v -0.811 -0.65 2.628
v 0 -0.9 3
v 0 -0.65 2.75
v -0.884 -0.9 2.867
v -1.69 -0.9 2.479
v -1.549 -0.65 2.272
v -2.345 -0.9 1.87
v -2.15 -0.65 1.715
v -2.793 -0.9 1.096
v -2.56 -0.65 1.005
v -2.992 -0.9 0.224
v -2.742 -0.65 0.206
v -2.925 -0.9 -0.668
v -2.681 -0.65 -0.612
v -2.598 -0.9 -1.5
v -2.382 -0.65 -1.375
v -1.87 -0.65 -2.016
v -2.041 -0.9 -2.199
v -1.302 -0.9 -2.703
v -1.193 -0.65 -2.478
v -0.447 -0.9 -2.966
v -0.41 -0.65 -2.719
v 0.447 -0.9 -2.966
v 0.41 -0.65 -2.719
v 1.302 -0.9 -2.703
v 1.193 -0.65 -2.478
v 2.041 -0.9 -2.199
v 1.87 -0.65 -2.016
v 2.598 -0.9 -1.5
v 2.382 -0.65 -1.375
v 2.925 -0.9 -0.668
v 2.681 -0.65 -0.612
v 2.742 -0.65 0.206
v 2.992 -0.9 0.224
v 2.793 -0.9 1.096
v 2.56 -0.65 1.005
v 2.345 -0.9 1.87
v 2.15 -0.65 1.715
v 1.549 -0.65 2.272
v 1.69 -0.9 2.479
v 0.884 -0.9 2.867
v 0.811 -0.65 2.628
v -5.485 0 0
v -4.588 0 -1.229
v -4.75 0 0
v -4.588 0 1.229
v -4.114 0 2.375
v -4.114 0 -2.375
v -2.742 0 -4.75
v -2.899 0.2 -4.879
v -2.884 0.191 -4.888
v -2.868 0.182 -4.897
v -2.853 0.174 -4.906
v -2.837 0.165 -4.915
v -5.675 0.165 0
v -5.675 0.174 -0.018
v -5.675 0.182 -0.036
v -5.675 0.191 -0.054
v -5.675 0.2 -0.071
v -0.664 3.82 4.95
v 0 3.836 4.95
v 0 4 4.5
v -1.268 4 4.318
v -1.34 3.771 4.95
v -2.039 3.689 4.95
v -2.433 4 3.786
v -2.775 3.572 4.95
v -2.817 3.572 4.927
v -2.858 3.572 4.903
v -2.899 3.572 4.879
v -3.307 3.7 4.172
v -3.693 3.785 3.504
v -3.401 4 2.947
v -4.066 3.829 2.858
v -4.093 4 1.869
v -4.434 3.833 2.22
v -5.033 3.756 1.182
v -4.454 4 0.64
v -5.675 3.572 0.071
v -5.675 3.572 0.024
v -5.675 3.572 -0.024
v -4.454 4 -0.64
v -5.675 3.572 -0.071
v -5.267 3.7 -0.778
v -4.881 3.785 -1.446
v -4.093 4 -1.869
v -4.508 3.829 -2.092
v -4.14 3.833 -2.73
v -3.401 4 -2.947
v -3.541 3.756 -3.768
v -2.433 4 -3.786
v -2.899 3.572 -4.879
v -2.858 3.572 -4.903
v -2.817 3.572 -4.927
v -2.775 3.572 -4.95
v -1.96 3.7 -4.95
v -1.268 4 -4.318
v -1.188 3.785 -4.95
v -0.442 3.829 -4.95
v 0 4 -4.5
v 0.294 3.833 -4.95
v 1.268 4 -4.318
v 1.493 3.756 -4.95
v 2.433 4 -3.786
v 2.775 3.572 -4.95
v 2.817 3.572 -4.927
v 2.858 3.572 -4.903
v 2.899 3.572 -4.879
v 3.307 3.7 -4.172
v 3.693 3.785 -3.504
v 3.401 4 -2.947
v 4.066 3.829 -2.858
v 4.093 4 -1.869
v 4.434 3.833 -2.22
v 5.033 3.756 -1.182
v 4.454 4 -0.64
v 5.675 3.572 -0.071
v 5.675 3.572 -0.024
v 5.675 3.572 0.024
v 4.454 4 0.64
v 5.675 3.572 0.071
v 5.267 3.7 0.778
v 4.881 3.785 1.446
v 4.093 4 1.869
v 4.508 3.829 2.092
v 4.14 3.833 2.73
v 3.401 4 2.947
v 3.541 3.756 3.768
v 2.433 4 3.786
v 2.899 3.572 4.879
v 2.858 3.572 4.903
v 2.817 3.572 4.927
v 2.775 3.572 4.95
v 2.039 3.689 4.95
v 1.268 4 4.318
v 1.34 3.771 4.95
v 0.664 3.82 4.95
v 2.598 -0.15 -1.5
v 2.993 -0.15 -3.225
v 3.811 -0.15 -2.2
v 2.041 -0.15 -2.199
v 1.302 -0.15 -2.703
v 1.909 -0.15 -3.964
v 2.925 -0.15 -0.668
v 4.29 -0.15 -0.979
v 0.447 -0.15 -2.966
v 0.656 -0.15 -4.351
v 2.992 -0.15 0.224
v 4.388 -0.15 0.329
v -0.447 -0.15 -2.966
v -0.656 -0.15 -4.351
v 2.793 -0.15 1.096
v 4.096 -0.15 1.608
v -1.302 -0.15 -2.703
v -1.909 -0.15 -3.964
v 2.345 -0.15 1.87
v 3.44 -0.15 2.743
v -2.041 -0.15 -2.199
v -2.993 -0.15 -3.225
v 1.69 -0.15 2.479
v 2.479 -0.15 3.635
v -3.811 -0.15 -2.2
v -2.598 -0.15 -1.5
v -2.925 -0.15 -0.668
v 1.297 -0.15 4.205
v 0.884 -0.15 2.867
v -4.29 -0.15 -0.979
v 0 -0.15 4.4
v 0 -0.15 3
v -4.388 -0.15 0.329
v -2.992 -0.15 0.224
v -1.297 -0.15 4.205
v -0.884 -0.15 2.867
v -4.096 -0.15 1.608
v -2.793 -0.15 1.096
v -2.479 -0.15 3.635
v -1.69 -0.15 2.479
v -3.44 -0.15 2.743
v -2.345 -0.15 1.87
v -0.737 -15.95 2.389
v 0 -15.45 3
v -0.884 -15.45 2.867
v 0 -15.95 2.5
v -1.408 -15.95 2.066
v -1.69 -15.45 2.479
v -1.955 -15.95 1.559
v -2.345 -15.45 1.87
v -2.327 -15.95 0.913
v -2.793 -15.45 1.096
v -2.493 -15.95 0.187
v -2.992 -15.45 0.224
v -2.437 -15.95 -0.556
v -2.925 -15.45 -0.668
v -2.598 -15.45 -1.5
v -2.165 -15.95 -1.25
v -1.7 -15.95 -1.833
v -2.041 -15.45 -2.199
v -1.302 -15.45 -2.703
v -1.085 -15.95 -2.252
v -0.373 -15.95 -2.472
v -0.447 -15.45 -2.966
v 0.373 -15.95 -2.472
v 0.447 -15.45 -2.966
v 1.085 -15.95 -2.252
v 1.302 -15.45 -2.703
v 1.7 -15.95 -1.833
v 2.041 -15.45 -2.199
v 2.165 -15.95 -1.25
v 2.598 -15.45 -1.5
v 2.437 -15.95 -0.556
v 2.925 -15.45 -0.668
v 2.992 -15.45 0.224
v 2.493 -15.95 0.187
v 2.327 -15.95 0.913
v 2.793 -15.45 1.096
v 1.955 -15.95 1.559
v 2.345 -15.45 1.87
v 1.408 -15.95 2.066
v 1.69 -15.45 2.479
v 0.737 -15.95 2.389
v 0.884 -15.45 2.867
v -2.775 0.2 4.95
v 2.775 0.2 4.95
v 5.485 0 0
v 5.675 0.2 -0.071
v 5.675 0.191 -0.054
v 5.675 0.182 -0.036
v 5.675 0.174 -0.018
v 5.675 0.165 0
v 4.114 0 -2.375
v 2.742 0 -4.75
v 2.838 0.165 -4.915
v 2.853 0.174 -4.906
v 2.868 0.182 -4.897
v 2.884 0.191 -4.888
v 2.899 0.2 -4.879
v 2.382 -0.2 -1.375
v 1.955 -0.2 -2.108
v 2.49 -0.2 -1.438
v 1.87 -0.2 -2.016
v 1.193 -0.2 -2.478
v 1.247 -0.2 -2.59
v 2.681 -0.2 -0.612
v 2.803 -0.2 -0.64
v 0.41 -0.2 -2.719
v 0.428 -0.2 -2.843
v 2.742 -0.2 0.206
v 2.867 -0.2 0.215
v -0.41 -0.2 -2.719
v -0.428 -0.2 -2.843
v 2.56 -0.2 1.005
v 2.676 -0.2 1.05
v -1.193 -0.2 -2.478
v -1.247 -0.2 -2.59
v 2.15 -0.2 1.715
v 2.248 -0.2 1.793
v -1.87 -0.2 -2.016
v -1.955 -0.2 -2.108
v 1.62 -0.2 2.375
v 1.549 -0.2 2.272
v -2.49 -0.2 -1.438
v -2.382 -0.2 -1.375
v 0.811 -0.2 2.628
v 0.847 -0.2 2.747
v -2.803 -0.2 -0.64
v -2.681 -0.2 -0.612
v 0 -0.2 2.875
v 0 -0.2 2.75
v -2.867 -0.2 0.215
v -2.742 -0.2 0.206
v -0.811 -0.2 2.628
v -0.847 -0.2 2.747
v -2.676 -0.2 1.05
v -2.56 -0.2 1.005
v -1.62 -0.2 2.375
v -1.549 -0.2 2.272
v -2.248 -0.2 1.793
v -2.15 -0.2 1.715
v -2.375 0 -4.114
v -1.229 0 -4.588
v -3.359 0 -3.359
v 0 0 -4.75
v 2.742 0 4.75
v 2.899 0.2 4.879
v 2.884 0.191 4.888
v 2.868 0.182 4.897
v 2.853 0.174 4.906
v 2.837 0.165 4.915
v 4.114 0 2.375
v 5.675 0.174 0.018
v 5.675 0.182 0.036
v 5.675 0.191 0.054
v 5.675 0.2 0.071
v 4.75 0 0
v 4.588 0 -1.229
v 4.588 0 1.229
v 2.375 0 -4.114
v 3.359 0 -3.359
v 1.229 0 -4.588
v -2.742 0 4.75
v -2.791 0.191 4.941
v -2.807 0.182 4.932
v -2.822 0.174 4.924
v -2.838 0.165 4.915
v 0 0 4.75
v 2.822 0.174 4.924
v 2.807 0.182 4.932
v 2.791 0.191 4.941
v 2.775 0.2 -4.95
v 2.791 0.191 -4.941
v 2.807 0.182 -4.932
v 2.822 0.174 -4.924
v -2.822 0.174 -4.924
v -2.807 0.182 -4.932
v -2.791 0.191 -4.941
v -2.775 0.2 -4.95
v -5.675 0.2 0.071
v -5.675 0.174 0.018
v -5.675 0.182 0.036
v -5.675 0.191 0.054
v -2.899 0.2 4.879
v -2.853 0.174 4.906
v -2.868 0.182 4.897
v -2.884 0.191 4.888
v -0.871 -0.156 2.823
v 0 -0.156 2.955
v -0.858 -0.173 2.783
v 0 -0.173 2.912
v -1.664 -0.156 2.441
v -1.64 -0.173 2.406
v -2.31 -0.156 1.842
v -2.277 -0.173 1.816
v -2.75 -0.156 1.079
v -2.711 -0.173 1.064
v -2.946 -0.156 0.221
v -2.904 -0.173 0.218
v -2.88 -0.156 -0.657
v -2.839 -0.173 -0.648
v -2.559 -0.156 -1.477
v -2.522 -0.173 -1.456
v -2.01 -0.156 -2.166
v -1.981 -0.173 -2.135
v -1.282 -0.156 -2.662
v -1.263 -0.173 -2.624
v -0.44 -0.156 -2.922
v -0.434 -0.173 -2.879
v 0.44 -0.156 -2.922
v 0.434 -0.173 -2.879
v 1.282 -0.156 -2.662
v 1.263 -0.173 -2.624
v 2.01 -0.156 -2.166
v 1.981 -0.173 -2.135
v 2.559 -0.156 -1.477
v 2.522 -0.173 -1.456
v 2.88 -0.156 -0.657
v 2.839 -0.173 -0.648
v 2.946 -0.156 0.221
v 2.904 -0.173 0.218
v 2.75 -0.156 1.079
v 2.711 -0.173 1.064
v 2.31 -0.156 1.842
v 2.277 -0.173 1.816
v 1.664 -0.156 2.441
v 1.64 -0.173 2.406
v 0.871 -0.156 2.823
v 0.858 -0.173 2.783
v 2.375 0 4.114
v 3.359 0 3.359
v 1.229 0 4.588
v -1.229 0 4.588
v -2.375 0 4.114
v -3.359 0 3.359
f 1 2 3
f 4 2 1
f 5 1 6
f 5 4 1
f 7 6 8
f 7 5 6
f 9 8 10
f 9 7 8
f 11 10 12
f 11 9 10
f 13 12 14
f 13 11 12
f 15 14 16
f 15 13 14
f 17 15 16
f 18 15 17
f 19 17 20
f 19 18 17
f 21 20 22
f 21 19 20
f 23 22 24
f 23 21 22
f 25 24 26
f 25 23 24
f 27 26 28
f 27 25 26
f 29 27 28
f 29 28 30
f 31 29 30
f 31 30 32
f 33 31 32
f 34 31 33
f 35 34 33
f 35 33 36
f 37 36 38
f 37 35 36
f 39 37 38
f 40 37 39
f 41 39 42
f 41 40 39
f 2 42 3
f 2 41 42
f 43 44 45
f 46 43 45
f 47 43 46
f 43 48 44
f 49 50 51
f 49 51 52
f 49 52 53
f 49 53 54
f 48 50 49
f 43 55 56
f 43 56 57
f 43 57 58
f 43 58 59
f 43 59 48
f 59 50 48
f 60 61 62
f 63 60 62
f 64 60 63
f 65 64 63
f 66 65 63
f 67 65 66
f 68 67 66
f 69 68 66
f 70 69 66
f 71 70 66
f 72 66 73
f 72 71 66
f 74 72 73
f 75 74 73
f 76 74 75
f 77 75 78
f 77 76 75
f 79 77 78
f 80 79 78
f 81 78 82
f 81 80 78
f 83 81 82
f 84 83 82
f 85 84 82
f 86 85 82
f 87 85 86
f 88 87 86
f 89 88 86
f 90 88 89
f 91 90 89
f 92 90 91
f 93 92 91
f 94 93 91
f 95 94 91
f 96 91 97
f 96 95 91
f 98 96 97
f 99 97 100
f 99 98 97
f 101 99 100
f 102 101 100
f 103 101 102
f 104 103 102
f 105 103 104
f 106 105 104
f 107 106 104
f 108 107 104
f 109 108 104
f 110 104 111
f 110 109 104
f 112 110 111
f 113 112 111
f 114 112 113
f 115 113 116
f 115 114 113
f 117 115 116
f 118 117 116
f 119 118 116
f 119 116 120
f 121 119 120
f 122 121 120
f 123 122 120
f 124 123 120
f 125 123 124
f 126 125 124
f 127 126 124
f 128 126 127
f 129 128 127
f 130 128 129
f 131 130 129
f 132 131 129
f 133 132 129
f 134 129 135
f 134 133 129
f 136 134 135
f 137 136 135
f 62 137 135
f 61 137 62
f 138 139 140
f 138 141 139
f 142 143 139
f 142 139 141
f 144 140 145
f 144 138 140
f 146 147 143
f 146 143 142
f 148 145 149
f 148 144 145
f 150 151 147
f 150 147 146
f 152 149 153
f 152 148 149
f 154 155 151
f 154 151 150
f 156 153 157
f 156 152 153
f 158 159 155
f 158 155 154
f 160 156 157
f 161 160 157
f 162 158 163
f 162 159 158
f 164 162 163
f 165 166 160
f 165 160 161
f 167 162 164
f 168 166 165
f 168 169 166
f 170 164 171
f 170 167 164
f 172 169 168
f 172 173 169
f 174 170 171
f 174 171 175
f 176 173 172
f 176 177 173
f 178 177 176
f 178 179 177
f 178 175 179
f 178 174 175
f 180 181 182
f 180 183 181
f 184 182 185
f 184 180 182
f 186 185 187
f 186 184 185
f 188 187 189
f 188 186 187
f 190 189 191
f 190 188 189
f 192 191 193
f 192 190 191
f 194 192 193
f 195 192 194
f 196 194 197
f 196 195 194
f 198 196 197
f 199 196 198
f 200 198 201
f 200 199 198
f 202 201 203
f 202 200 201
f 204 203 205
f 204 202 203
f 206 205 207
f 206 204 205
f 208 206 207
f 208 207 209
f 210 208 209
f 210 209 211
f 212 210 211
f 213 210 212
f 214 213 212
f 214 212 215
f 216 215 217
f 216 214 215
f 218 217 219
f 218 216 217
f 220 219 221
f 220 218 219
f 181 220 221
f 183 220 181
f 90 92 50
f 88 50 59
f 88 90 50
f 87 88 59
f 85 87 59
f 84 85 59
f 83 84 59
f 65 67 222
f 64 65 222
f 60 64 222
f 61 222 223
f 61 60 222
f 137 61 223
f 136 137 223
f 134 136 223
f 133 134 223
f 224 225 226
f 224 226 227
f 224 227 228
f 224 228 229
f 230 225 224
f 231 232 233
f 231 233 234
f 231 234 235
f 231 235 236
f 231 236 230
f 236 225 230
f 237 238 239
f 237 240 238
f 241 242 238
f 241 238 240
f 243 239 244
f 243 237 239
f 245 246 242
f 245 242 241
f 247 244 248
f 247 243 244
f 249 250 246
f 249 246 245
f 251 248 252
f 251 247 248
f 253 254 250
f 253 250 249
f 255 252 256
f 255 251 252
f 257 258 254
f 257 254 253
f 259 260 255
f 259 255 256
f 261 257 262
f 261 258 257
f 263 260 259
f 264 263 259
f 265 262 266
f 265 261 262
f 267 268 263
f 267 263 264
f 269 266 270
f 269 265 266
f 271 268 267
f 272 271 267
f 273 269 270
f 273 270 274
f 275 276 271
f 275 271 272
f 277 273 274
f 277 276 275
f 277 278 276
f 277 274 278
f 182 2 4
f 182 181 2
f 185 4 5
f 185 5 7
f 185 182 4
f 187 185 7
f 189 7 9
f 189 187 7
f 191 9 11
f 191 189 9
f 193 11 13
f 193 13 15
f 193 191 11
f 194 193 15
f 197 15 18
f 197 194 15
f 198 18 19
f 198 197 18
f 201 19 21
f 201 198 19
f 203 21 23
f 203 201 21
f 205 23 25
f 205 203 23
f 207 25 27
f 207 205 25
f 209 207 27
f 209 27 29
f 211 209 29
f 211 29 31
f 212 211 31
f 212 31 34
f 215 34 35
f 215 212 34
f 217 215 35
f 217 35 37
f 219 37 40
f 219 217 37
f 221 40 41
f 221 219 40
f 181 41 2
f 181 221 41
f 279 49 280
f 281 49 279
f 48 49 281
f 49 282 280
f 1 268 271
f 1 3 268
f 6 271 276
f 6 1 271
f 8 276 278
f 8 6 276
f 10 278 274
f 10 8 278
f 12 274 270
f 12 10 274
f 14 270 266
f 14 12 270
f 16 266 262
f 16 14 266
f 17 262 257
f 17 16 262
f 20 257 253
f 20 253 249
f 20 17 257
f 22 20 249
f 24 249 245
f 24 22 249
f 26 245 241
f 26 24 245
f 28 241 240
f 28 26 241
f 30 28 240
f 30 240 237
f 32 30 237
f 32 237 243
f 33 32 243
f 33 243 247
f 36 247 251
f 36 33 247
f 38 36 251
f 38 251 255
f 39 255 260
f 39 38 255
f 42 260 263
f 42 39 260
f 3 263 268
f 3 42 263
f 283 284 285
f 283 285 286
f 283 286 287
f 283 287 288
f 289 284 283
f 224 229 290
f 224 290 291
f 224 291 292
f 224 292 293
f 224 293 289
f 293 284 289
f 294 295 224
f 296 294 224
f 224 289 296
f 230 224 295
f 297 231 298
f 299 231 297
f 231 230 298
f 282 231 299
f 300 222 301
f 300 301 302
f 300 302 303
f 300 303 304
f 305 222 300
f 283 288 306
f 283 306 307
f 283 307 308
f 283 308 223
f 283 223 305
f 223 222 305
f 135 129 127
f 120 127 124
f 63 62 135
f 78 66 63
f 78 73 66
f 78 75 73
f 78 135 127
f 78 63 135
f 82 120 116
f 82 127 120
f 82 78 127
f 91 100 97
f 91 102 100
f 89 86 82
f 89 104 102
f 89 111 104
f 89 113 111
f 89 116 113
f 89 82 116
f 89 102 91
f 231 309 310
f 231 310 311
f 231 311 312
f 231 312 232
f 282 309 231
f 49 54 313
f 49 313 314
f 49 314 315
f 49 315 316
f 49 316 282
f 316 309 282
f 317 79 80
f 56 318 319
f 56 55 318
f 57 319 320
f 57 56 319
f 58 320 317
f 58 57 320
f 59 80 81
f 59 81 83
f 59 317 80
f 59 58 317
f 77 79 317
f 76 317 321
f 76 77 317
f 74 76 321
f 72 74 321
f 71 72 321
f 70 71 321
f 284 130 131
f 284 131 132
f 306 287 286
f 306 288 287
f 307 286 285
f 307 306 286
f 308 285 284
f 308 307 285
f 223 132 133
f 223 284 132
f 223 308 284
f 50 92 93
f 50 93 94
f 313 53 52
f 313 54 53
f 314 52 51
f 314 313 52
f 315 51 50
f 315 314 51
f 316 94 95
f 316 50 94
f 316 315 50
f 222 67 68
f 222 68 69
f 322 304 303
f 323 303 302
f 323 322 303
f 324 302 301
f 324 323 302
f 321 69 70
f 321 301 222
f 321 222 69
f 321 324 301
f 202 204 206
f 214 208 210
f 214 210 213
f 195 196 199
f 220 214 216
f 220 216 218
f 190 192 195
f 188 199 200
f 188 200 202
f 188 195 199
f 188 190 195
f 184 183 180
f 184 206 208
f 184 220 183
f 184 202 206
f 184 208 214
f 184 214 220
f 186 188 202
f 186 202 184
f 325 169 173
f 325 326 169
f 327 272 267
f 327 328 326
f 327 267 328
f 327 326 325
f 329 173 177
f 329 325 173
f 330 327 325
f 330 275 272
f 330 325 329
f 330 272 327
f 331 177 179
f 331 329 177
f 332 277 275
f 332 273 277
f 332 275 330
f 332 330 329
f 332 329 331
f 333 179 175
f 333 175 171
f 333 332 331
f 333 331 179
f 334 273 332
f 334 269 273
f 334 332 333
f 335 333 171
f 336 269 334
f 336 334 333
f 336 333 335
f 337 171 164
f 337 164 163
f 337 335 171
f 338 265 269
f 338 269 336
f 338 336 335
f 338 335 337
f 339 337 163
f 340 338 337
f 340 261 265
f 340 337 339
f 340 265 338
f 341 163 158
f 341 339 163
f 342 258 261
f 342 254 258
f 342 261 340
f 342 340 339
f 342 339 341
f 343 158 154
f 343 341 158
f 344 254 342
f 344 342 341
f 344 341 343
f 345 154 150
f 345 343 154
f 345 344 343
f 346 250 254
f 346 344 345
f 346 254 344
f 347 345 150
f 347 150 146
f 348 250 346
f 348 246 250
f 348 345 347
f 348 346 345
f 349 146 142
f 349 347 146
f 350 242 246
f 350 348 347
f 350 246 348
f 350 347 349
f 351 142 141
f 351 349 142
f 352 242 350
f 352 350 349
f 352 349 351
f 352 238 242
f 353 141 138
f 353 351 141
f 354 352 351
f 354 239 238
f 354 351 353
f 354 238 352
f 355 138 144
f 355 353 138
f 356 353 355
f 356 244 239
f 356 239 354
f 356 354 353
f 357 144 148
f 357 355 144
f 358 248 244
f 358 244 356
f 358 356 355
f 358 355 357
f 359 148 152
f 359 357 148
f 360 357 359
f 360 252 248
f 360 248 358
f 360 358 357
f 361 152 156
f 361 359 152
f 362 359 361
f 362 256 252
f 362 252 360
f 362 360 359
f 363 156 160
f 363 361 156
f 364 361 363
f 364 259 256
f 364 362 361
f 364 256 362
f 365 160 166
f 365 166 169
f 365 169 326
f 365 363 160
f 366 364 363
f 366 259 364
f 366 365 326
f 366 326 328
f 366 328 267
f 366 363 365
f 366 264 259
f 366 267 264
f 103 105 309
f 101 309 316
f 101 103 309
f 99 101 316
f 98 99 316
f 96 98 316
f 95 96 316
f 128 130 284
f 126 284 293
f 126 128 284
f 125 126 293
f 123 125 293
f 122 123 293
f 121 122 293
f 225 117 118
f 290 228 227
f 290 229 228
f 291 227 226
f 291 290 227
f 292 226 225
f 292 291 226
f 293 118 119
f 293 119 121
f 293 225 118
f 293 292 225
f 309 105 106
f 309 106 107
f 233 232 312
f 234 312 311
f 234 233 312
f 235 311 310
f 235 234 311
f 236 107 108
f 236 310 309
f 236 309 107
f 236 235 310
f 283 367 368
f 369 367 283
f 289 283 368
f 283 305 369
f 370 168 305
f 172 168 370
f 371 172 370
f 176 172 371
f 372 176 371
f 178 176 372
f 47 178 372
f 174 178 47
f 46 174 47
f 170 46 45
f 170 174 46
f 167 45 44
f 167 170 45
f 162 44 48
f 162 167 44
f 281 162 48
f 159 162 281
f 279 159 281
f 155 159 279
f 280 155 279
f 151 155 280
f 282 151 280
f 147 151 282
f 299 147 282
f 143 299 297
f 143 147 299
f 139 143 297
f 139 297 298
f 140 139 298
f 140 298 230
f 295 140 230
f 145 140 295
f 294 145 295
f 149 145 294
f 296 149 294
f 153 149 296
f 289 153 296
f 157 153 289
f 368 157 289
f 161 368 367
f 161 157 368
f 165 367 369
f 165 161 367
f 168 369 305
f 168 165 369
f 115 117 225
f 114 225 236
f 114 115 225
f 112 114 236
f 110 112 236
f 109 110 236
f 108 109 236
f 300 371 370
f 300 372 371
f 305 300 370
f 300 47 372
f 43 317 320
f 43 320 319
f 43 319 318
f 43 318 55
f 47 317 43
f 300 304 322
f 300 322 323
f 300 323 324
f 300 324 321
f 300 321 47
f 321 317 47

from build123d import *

# Parameters (mm, degrees)
SKETCH2_OUTSIDE_W  = 18.472
SKETCH2_OUTSIDE_H  = 18.472
CUT_EXTRUDE1_DEPTH = 19.95
CHAMFER1_SIZE      = 0.2


with BuildPart() as part:
    # Sketch1 → Revolve1 (revolve)
    with BuildSketch(Plane(origin=(0, 0, 0), x_dir=(0, 0, -1), z_dir=(1, 0, 0)), mode=Mode.PRIVATE) as revolve1_sk:
        with BuildLine():
            Line((0, 4), (4.5, 4))
            Line((4.5, 4), (5.675, 3.572334975))
            Line((5.675, 3.572334975), (5.675, 0))
            Line((5.675, 0), (4.75, 0))
            Line((4.75, 0), (4.4, -0.15))
            Line((4.4, -0.15), (3, -0.15))
            ThreePointArc((3, -0.15), (2.93268544, -0.1629636), (2.875, -0.2))
            Line((2.875, -0.2), (2.75, -0.2))
            Line((2.75, -0.2), (2.75, -0.65))
            Line((2.75, -0.65), (3, -0.9))
            Line((3, -0.9), (3, -15.45))
            Line((3, -15.45), (2.5, -15.95))
            Line((2.5, -15.95), (0, -15.95))
            Line((0, -15.95), (0, 4))
        make_face()
    revolve(revolve1_sk.sketch.rotate(Axis((0, 15.969730791, 0), (0, -1, 0)), 180), axis=Axis((0, 15.969730791, 0), (0, -1, 0)))

    # Sketch2 outside → Cut-Extrude1 (cut)
    with BuildSketch(Plane(origin=(0, 4, 0), x_dir=(1, 0, 0), z_dir=(0, 1, 0))):
        Rectangle(SKETCH2_OUTSIDE_W, SKETCH2_OUTSIDE_H)
        Polygon((2.857883832, -4.95), (5.715767665, 0), (2.857883832, 4.95), (-2.857883832, 4.95), (-5.715767665, 0), (-2.857883832, -4.95), align=None, mode=Mode.SUBTRACT)
    extrude(amount=-CUT_EXTRUDE1_DEPTH, mode=Mode.SUBTRACT)

    # Chamfer1
    # the kernel refuses this chamfer: 0.2 mm, written as the material it takes off along each edge
    with BuildSketch(Plane(origin=(-2.641932243, 0, 5.324039125), x_dir=(-0.023812127644090332, 0.9996219169112968, 0.01374793830529327), z_dir=(-0.4999999999999996, 0, -0.8660254037844389)), Plane(origin=(3.289787011, 0, 4.95), x_dir=(0, 0.9996219169112966, 0.027495876610587326), z_dir=(-1, 0, 0)), Plane(origin=(5.931719254, 0, -0.374039125), x_dir=(0.023812127644088587, 0.9996219169112968, 0.013747938305292286), z_dir=(-0.5000000000000003, 0, 0.8660254037844386)), Plane(origin=(-5.931719254, 0, 0.374039125), x_dir=(-0.023812127644091206, 0.9996219169112966, -0.013747938305293793), z_dir=(0.5000000000000002, 0, -0.8660254037844386)), Plane(origin=(-3.289787011, 0, -4.95), x_dir=(0, 0.9996219169112966, -0.027495876610587326), z_dir=(1, 0, 0)), Plane(origin=(2.641932243, 0, -5.324039125), x_dir=(0.02381212764409033, 0.9996219169112968, -0.013747938305293275), z_dir=(0.49999999999999994, 0, 0.8660254037844388))) as chamfer1_piece_1:
        Polygon((CHAMFER1_SIZE * 0.999621916911, CHAMFER1_SIZE * 0.0274958766106), (-CHAMFER1_SIZE * 0.0274958766106, CHAMFER1_SIZE * 0.999621916911), (0, 0), align=None)
    extrude(amount=6.579574023, mode=Mode.SUBTRACT)


solid = part.part
